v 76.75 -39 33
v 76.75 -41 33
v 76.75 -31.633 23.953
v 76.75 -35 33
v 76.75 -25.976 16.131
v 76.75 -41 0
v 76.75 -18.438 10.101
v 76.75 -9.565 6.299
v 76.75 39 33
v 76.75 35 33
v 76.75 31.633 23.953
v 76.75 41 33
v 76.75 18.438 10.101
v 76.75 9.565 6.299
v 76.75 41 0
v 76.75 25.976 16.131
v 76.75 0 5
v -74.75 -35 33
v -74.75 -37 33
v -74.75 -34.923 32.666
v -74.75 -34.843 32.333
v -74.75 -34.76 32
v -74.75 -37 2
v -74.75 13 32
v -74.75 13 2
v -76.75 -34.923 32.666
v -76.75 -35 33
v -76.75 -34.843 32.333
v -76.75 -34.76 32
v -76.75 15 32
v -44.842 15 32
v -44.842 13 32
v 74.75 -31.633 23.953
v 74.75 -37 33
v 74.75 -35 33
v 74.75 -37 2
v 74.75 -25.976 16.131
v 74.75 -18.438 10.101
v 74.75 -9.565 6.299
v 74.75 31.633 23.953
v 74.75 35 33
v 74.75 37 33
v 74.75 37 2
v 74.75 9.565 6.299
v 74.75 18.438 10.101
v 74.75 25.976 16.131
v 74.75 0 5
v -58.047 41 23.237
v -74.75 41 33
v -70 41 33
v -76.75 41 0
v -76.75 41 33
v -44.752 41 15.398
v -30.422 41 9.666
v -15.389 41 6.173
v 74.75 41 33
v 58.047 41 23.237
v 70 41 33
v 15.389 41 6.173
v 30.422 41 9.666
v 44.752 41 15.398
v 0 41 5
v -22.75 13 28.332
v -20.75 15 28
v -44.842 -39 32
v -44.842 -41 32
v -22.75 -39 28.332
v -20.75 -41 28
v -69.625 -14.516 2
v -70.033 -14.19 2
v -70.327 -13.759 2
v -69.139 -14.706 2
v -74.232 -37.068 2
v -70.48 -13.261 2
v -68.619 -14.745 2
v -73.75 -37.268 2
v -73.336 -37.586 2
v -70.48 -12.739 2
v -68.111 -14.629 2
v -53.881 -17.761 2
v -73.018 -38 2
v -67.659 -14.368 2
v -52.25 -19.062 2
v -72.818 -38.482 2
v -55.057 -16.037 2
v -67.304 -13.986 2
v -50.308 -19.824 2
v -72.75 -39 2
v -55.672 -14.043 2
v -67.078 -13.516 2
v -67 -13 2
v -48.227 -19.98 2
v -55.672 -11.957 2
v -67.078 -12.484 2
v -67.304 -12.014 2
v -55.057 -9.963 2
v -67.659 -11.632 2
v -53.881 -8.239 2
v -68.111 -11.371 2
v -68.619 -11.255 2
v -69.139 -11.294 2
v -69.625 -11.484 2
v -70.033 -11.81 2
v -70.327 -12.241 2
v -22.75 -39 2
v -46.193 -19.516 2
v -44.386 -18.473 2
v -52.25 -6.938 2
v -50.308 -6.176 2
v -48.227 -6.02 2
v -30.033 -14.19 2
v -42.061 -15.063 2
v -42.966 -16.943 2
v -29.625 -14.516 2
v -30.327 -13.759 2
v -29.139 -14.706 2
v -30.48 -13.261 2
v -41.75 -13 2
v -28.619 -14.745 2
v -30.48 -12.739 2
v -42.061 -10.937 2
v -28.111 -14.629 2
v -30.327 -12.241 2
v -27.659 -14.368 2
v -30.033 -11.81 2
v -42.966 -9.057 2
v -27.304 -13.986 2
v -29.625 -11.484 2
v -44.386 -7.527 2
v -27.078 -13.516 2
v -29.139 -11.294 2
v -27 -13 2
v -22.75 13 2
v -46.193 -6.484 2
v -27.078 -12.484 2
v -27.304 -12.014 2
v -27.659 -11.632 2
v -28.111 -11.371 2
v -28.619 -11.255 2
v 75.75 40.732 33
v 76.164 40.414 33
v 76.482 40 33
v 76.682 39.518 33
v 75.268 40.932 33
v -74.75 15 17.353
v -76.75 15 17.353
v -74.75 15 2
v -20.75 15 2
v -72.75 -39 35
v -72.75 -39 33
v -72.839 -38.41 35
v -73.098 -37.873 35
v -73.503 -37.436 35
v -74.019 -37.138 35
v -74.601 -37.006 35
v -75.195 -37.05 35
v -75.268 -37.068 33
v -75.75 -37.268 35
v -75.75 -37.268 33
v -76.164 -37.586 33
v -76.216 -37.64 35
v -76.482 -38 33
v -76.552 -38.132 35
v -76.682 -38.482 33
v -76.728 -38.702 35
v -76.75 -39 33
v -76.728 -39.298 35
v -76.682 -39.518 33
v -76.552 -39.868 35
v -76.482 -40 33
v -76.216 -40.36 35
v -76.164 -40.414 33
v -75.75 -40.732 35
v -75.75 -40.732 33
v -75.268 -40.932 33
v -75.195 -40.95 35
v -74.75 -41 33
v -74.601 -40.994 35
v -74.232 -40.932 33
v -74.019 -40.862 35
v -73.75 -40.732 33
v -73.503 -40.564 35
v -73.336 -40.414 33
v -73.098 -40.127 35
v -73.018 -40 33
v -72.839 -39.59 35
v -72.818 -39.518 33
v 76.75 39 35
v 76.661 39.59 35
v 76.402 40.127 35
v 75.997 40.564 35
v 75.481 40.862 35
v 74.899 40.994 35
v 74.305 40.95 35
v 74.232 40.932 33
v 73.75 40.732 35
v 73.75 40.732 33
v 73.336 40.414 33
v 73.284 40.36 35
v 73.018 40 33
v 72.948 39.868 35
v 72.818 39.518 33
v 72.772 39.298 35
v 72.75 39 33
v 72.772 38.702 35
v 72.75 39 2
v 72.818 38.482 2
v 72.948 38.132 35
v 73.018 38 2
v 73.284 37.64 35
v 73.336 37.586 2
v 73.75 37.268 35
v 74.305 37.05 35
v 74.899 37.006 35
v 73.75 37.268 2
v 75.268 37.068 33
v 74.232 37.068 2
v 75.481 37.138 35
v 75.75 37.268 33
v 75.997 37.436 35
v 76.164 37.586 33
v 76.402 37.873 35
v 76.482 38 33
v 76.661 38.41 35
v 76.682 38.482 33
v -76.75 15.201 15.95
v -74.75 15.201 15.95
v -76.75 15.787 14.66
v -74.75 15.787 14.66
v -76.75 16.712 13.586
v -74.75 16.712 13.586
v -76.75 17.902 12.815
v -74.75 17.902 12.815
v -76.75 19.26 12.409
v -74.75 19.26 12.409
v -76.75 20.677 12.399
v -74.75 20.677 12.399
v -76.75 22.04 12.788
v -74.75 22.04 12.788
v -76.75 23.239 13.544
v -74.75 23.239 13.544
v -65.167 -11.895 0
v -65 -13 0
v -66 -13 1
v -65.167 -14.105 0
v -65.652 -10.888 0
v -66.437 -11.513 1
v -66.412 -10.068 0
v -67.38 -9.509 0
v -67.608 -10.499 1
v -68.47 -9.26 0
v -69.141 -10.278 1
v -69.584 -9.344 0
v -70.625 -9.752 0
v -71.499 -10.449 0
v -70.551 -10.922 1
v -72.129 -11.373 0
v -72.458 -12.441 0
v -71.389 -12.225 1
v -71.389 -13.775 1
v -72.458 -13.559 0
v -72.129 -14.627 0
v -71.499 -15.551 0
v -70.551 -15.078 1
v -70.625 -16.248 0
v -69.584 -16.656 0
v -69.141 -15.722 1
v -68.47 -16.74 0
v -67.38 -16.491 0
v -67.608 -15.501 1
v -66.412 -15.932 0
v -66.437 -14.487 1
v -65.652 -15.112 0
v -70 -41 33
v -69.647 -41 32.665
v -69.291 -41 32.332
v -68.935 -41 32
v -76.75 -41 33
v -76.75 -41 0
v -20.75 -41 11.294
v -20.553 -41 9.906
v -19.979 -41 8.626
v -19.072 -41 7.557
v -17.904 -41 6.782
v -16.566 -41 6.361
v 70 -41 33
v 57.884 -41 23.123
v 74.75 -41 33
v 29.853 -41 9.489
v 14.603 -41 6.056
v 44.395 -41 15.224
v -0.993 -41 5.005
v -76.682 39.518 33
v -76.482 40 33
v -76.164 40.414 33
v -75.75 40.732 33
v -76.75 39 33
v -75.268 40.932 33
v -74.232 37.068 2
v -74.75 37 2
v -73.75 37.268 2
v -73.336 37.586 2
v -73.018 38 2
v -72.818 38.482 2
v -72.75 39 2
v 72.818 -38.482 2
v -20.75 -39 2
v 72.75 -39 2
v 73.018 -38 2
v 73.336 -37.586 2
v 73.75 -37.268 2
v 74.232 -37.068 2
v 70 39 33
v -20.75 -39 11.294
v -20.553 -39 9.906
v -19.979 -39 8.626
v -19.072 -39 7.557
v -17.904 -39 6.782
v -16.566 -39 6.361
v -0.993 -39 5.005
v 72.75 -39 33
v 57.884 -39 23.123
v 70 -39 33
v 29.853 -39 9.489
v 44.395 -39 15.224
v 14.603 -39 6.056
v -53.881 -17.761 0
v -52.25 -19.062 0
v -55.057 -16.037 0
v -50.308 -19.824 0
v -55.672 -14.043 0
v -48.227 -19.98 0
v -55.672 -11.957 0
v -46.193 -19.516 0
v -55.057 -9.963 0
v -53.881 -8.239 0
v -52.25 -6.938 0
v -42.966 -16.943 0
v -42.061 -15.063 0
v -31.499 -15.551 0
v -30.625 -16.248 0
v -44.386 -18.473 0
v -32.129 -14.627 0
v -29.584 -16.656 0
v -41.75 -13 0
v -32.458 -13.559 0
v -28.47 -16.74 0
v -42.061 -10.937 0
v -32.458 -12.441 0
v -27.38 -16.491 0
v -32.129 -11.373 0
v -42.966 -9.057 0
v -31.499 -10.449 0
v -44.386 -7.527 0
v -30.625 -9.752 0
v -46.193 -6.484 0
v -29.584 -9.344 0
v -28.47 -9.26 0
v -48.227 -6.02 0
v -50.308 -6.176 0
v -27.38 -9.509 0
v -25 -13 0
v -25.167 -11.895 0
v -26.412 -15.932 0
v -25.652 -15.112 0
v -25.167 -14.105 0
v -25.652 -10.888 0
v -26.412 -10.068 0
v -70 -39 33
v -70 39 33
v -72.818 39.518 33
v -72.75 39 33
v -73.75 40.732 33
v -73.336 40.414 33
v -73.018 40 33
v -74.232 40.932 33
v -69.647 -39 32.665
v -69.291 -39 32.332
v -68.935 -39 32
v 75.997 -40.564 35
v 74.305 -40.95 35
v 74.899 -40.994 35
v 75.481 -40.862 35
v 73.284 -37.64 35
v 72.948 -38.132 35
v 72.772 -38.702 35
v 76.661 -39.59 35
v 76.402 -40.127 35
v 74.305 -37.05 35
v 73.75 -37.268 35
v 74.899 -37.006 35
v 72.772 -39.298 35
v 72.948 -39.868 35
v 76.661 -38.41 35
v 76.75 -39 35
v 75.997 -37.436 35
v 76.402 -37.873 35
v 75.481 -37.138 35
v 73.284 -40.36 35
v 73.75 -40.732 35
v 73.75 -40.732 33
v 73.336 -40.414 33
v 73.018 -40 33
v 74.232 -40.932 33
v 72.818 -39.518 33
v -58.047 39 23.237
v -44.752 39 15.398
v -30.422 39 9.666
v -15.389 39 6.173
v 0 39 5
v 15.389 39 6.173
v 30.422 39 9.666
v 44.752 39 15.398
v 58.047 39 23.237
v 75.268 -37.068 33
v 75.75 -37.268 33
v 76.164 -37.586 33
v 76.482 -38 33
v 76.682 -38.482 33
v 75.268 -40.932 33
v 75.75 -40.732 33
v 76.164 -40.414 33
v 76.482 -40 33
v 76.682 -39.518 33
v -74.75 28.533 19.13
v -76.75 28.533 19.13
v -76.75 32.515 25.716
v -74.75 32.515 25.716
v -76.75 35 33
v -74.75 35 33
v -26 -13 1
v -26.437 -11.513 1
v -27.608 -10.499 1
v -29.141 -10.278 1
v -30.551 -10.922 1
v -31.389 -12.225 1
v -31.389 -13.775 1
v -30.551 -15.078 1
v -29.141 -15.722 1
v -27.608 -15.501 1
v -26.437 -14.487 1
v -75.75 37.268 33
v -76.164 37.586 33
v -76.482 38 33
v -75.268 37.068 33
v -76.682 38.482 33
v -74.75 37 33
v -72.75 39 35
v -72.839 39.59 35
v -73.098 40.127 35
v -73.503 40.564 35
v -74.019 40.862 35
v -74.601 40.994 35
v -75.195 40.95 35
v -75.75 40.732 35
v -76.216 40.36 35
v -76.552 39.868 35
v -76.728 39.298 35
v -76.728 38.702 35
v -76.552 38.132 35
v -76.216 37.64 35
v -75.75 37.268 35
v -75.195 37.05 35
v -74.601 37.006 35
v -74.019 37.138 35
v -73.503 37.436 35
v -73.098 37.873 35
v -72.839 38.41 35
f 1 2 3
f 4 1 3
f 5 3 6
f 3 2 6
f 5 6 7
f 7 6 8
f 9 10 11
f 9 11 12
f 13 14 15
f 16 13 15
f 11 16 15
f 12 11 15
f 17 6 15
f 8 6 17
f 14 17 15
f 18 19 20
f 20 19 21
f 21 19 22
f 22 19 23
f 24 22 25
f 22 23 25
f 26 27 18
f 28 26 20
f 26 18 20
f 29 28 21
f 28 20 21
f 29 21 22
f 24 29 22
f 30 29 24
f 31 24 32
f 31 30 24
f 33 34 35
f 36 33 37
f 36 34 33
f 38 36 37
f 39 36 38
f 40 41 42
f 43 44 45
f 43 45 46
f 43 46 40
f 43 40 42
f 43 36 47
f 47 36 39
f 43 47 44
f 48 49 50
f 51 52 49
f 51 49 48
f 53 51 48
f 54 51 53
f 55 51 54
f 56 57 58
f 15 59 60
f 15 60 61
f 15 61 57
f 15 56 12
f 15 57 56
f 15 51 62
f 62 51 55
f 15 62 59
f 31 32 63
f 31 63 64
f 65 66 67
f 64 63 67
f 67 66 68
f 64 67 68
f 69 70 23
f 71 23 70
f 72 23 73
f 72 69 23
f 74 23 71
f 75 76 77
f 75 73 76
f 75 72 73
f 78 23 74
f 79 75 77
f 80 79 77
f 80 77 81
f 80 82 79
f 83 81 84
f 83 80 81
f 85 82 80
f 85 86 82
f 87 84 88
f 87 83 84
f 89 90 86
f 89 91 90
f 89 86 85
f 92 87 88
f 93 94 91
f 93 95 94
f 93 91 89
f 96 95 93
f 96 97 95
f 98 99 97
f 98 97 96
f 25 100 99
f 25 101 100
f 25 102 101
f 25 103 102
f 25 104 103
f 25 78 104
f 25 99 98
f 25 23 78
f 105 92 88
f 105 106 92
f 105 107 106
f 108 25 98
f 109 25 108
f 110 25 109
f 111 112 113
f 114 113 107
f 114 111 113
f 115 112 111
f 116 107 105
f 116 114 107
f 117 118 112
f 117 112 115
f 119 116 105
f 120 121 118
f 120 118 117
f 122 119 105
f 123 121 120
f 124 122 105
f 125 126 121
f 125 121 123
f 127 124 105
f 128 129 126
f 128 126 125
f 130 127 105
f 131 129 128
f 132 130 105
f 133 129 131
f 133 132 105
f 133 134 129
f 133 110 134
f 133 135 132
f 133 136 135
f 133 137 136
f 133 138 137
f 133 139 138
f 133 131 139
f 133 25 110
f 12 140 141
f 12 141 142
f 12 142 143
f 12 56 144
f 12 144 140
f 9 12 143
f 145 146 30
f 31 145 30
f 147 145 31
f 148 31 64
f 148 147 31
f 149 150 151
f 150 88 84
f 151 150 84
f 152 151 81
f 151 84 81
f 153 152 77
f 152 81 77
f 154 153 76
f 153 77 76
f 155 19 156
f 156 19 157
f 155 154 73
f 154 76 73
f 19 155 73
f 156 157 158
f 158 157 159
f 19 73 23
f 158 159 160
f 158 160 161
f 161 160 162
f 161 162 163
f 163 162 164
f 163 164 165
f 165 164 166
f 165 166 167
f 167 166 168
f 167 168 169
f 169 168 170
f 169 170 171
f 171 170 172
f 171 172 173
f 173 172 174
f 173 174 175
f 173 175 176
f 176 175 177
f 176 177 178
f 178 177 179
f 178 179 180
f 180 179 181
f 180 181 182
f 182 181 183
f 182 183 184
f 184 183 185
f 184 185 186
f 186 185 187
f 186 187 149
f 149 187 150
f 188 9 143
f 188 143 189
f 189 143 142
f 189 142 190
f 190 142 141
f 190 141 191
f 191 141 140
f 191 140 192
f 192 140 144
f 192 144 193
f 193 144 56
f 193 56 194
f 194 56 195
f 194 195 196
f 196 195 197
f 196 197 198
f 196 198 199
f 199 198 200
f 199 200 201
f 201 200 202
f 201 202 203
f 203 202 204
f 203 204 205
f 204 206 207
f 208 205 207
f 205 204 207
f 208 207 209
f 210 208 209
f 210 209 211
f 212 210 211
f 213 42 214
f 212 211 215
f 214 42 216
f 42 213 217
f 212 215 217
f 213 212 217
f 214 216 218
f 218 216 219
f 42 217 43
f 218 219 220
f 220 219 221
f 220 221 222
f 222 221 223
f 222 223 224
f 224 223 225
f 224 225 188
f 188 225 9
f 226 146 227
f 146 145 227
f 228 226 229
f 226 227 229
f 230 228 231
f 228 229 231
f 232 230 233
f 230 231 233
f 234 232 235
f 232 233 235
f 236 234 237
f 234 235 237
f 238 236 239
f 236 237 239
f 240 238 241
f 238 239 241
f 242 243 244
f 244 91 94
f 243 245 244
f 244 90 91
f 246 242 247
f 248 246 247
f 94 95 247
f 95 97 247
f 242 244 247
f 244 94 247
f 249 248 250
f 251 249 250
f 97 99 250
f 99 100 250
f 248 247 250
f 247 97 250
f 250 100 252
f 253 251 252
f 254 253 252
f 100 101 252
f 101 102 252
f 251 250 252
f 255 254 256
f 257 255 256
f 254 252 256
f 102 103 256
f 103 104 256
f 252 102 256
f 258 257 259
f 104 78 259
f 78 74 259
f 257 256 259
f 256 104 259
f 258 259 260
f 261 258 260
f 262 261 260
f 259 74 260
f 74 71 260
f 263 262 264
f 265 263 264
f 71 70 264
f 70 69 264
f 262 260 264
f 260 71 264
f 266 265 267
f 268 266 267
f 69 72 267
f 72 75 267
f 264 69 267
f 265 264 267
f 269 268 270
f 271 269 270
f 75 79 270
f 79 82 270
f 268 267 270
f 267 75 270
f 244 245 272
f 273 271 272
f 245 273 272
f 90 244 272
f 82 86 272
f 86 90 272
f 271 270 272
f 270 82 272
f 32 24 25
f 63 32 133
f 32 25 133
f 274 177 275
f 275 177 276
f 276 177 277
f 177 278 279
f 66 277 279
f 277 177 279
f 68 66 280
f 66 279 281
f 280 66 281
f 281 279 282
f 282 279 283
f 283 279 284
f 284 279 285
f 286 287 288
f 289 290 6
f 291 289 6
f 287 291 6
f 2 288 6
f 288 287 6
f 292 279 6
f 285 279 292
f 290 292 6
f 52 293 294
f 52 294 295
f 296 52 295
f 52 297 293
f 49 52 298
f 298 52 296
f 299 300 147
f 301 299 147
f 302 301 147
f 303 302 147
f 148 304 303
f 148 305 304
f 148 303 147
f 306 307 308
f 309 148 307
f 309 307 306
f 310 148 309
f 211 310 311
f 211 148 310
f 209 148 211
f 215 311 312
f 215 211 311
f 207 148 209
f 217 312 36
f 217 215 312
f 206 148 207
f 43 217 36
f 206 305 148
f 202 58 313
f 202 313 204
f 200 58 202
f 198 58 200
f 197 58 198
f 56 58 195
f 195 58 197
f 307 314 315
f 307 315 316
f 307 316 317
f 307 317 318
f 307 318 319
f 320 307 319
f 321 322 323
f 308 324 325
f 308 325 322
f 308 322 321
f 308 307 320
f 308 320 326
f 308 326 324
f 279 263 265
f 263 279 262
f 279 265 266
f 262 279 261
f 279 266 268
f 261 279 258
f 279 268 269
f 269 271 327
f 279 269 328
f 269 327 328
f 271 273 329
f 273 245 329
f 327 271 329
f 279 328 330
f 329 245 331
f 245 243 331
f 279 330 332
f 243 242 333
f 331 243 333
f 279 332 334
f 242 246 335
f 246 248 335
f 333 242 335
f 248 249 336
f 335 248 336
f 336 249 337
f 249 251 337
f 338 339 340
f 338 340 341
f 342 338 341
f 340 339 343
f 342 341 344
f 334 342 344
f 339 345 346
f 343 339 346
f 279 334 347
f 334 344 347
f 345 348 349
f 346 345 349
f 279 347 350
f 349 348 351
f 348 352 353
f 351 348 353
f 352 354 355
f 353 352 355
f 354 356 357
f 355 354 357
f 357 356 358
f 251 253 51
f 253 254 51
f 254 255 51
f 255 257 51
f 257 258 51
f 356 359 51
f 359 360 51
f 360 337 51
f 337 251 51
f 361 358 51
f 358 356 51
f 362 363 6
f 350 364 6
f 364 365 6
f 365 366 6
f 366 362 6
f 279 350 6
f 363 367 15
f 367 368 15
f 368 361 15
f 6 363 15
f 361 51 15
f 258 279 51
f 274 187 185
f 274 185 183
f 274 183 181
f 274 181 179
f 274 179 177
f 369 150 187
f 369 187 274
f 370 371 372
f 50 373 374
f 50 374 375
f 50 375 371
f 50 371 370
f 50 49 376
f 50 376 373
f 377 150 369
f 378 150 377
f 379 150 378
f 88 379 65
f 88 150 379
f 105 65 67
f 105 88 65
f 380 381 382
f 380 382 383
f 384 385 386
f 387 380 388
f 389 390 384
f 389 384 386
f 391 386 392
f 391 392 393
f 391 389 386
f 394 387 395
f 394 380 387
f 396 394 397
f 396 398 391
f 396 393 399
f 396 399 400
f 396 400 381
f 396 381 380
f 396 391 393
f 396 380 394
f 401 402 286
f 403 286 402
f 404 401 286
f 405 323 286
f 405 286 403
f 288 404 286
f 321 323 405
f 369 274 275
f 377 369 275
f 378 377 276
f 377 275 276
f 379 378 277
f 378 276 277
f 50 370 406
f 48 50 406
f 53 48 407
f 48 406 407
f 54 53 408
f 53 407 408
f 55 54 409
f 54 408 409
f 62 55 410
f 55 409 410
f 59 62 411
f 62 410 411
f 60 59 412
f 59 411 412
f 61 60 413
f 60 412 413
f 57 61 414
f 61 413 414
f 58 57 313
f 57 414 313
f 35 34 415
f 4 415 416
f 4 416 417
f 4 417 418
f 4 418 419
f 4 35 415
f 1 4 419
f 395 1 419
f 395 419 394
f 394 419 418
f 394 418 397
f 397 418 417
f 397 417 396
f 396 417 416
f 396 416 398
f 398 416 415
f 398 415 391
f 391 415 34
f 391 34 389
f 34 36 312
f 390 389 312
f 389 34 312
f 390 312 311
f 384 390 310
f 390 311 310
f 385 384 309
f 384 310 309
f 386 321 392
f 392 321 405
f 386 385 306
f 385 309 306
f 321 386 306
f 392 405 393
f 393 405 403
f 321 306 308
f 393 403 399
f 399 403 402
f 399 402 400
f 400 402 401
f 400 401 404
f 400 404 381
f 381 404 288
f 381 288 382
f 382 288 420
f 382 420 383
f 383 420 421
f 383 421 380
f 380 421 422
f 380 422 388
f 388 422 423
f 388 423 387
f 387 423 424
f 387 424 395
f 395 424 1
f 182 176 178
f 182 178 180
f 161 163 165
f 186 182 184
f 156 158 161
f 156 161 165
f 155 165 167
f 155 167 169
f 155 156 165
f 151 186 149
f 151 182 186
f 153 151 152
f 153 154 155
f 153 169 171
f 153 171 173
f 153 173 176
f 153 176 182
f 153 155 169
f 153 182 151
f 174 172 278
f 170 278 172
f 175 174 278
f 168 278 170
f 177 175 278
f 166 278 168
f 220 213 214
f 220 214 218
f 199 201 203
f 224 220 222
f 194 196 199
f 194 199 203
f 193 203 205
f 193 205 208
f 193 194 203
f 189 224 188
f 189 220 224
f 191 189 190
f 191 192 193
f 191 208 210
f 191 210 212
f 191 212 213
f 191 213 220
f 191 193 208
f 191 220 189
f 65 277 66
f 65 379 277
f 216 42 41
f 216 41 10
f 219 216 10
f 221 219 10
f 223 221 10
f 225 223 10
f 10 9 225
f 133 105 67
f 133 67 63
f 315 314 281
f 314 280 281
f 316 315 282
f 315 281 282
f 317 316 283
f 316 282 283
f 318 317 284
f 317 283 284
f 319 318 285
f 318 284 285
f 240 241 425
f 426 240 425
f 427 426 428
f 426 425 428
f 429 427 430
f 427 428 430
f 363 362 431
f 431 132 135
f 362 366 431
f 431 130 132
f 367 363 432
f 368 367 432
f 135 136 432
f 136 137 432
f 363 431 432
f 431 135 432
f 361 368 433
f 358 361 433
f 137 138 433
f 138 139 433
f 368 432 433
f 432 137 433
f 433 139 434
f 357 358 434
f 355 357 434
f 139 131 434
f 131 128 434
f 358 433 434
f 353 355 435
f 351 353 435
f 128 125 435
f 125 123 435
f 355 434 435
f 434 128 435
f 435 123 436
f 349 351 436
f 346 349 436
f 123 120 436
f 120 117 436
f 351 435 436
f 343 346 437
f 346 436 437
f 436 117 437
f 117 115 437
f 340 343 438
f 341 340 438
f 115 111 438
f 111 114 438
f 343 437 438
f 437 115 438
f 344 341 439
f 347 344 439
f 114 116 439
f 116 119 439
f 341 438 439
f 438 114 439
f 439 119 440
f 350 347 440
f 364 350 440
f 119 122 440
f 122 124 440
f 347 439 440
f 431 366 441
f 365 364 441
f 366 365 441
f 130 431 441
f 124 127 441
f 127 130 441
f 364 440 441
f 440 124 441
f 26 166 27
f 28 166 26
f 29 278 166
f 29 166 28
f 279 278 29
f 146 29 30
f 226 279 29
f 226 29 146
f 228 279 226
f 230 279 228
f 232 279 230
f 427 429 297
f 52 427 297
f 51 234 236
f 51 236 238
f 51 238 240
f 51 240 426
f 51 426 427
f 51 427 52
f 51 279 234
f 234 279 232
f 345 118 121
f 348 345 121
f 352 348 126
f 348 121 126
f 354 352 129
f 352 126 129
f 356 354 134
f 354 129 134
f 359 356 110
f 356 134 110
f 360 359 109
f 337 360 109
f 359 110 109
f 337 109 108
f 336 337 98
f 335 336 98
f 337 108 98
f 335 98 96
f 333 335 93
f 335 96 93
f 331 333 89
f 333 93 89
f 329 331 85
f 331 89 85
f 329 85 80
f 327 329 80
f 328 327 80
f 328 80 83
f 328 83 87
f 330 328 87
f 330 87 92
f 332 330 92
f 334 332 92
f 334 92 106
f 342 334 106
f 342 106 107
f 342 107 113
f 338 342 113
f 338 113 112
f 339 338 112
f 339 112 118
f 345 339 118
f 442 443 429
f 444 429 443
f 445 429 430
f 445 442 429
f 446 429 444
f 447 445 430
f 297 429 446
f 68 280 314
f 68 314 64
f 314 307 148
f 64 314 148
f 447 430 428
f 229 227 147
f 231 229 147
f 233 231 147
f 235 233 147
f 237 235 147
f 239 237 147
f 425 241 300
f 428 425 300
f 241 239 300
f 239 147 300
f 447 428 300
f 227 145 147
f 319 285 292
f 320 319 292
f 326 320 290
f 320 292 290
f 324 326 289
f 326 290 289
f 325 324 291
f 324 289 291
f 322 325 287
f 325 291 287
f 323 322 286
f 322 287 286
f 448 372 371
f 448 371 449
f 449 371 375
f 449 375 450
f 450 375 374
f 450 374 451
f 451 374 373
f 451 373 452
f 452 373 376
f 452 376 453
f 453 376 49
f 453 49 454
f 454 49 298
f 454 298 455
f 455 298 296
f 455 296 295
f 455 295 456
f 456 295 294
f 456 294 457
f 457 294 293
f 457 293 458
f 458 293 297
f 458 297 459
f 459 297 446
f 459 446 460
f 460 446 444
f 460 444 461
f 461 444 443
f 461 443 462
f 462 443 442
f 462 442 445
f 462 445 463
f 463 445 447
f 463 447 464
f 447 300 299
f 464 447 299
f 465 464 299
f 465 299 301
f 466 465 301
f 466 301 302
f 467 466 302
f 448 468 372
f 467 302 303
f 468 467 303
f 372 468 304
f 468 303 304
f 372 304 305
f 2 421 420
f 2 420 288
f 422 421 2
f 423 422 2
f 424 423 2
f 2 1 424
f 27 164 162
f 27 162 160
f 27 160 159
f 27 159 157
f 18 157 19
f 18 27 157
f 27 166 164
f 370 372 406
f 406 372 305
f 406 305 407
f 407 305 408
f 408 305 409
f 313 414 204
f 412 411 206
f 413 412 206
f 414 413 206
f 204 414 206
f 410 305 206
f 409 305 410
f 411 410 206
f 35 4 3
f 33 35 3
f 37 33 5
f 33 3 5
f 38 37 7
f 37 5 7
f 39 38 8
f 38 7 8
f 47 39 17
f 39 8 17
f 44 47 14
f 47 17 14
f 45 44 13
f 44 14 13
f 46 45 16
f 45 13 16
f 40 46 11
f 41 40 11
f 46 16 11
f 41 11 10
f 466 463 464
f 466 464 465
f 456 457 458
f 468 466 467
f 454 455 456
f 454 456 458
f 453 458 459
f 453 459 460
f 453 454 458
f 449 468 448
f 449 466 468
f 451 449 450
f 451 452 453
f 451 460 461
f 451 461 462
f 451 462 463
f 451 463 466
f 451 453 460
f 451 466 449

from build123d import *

# Parameters (mm, degrees)
F0_W      = 153.5
F0_H      = 82
F1_DEPTH  = 2
F2_R      = 7
F2_R_2    = 1.75
F3_DEPTH  = 2.001
F4_SIZE   = 1.99999
F5_R      = 2
F6_DEPTH  = 33
F7_W      = 153.5
F7_H      = 82
F7_W_2    = 149.5
F7_H_2    = 78
F8_DEPTH  = 31
F10_DEPTH = 82.001
F12_DEPTH = 153.501
F13_W     = 56
F13_H     = 56
F13_W_2   = 52
F13_H_2   = 52
F14_DEPTH = 30
F16_DEPTH = 82.001
F17_R     = 5


# Not quite as in the source:
# - a fillet or chamfer is up to 0.001 mm smaller than in the source, because OpenCascade refuses the exact size


with BuildPart() as f1:
    # F0 (on Top) → F1 (new body)
    with BuildSketch(Plane.XY):
        Rectangle(F0_W, F0_H)
    extrude(amount=F1_DEPTH)

    # F2 (on face) → F3 (cut, through all)
    with BuildSketch(Plane.XY.offset(2)):
        with Locations((-48.75, -13)):
            Circle(F2_R)
        with Locations((-68.75, -13)):
            Circle(F2_R_2)
        with Locations((-28.75, -13)):
            Circle(F2_R_2)
    extrude(amount=-F3_DEPTH, mode=Mode.SUBTRACT)

    # F4 (size 2 in the source; OpenCascade refuses exactly that, so slightly less here)
    f4_edges = [f1.edges().sort_by_distance(p)[0] for p in [
        (-70.5, -13, 0),
        (-30.5, -13, 0),
    ]]
    chamfer(f4_edges, length=F4_SIZE)

    # F5 (on face) → F6 (join)
    with BuildSketch(Plane.XY.offset(2)):
        with Locations((-74.75, 39)):
            Circle(F5_R)
        with Locations((74.75, 39)):
            Circle(F5_R)
        with Locations((-74.75, -39)):
            Circle(F5_R)
        with Locations((74.75, -39)):
            Circle(F5_R)
    extrude(amount=F6_DEPTH)

    # F7 (on face) → F8 (join)
    with BuildSketch(Plane.XY.offset(2)):
        Rectangle(F7_W, F7_H)
        Rectangle(F7_W_2, F7_H_2, mode=Mode.SUBTRACT)
    extrude(amount=F8_DEPTH)

    # F9 (on face) → F10 (cut, through all)
    with BuildSketch(Plane.XZ.offset(41)):
        with BuildLine():
            Line((70, 33), (-70, 33))
            ThreePointArc((-70, 33), (0, 5), (70, 33))
        make_face()
    extrude(amount=-F10_DEPTH, mode=Mode.SUBTRACT)

    # F11 (on face) → F12 (cut, through all)
    with BuildSketch(Plane.YZ.offset(76.75)):
        with BuildLine():
            Line((35, 33), (-35, 33))
            ThreePointArc((-35, 33), (0, 5), (35, 33))
        make_face()
    extrude(amount=-F12_DEPTH, mode=Mode.SUBTRACT)

    # F13 (on face) → F14 (join)
    with BuildSketch(Plane.XY.offset(2)):
        with Locations((-48.75, -13)):
            Rectangle(F13_W, F13_H)
        with Locations((-48.75, -13)):
            Rectangle(F13_W_2, F13_H_2, mode=Mode.SUBTRACT)
    extrude(amount=F14_DEPTH)

    # F15 (on face) → F16 (cut, through all)
    with BuildSketch(Plane.XZ.offset(41)):
        Polygon((-20.75, 28), (-20.75, 32), (-44.8423758792, 32), align=None)
    extrude(amount=-F16_DEPTH, mode=Mode.SUBTRACT)

    # F17
    f17_edges = [f1.edges().sort_by_distance(p)[0] for p in [
        (-20.75, -40, 7.143634),
        (-75.75, 15, 8.286419),
    ]]
    fillet(f17_edges, radius=F17_R)


solid = f1.part
